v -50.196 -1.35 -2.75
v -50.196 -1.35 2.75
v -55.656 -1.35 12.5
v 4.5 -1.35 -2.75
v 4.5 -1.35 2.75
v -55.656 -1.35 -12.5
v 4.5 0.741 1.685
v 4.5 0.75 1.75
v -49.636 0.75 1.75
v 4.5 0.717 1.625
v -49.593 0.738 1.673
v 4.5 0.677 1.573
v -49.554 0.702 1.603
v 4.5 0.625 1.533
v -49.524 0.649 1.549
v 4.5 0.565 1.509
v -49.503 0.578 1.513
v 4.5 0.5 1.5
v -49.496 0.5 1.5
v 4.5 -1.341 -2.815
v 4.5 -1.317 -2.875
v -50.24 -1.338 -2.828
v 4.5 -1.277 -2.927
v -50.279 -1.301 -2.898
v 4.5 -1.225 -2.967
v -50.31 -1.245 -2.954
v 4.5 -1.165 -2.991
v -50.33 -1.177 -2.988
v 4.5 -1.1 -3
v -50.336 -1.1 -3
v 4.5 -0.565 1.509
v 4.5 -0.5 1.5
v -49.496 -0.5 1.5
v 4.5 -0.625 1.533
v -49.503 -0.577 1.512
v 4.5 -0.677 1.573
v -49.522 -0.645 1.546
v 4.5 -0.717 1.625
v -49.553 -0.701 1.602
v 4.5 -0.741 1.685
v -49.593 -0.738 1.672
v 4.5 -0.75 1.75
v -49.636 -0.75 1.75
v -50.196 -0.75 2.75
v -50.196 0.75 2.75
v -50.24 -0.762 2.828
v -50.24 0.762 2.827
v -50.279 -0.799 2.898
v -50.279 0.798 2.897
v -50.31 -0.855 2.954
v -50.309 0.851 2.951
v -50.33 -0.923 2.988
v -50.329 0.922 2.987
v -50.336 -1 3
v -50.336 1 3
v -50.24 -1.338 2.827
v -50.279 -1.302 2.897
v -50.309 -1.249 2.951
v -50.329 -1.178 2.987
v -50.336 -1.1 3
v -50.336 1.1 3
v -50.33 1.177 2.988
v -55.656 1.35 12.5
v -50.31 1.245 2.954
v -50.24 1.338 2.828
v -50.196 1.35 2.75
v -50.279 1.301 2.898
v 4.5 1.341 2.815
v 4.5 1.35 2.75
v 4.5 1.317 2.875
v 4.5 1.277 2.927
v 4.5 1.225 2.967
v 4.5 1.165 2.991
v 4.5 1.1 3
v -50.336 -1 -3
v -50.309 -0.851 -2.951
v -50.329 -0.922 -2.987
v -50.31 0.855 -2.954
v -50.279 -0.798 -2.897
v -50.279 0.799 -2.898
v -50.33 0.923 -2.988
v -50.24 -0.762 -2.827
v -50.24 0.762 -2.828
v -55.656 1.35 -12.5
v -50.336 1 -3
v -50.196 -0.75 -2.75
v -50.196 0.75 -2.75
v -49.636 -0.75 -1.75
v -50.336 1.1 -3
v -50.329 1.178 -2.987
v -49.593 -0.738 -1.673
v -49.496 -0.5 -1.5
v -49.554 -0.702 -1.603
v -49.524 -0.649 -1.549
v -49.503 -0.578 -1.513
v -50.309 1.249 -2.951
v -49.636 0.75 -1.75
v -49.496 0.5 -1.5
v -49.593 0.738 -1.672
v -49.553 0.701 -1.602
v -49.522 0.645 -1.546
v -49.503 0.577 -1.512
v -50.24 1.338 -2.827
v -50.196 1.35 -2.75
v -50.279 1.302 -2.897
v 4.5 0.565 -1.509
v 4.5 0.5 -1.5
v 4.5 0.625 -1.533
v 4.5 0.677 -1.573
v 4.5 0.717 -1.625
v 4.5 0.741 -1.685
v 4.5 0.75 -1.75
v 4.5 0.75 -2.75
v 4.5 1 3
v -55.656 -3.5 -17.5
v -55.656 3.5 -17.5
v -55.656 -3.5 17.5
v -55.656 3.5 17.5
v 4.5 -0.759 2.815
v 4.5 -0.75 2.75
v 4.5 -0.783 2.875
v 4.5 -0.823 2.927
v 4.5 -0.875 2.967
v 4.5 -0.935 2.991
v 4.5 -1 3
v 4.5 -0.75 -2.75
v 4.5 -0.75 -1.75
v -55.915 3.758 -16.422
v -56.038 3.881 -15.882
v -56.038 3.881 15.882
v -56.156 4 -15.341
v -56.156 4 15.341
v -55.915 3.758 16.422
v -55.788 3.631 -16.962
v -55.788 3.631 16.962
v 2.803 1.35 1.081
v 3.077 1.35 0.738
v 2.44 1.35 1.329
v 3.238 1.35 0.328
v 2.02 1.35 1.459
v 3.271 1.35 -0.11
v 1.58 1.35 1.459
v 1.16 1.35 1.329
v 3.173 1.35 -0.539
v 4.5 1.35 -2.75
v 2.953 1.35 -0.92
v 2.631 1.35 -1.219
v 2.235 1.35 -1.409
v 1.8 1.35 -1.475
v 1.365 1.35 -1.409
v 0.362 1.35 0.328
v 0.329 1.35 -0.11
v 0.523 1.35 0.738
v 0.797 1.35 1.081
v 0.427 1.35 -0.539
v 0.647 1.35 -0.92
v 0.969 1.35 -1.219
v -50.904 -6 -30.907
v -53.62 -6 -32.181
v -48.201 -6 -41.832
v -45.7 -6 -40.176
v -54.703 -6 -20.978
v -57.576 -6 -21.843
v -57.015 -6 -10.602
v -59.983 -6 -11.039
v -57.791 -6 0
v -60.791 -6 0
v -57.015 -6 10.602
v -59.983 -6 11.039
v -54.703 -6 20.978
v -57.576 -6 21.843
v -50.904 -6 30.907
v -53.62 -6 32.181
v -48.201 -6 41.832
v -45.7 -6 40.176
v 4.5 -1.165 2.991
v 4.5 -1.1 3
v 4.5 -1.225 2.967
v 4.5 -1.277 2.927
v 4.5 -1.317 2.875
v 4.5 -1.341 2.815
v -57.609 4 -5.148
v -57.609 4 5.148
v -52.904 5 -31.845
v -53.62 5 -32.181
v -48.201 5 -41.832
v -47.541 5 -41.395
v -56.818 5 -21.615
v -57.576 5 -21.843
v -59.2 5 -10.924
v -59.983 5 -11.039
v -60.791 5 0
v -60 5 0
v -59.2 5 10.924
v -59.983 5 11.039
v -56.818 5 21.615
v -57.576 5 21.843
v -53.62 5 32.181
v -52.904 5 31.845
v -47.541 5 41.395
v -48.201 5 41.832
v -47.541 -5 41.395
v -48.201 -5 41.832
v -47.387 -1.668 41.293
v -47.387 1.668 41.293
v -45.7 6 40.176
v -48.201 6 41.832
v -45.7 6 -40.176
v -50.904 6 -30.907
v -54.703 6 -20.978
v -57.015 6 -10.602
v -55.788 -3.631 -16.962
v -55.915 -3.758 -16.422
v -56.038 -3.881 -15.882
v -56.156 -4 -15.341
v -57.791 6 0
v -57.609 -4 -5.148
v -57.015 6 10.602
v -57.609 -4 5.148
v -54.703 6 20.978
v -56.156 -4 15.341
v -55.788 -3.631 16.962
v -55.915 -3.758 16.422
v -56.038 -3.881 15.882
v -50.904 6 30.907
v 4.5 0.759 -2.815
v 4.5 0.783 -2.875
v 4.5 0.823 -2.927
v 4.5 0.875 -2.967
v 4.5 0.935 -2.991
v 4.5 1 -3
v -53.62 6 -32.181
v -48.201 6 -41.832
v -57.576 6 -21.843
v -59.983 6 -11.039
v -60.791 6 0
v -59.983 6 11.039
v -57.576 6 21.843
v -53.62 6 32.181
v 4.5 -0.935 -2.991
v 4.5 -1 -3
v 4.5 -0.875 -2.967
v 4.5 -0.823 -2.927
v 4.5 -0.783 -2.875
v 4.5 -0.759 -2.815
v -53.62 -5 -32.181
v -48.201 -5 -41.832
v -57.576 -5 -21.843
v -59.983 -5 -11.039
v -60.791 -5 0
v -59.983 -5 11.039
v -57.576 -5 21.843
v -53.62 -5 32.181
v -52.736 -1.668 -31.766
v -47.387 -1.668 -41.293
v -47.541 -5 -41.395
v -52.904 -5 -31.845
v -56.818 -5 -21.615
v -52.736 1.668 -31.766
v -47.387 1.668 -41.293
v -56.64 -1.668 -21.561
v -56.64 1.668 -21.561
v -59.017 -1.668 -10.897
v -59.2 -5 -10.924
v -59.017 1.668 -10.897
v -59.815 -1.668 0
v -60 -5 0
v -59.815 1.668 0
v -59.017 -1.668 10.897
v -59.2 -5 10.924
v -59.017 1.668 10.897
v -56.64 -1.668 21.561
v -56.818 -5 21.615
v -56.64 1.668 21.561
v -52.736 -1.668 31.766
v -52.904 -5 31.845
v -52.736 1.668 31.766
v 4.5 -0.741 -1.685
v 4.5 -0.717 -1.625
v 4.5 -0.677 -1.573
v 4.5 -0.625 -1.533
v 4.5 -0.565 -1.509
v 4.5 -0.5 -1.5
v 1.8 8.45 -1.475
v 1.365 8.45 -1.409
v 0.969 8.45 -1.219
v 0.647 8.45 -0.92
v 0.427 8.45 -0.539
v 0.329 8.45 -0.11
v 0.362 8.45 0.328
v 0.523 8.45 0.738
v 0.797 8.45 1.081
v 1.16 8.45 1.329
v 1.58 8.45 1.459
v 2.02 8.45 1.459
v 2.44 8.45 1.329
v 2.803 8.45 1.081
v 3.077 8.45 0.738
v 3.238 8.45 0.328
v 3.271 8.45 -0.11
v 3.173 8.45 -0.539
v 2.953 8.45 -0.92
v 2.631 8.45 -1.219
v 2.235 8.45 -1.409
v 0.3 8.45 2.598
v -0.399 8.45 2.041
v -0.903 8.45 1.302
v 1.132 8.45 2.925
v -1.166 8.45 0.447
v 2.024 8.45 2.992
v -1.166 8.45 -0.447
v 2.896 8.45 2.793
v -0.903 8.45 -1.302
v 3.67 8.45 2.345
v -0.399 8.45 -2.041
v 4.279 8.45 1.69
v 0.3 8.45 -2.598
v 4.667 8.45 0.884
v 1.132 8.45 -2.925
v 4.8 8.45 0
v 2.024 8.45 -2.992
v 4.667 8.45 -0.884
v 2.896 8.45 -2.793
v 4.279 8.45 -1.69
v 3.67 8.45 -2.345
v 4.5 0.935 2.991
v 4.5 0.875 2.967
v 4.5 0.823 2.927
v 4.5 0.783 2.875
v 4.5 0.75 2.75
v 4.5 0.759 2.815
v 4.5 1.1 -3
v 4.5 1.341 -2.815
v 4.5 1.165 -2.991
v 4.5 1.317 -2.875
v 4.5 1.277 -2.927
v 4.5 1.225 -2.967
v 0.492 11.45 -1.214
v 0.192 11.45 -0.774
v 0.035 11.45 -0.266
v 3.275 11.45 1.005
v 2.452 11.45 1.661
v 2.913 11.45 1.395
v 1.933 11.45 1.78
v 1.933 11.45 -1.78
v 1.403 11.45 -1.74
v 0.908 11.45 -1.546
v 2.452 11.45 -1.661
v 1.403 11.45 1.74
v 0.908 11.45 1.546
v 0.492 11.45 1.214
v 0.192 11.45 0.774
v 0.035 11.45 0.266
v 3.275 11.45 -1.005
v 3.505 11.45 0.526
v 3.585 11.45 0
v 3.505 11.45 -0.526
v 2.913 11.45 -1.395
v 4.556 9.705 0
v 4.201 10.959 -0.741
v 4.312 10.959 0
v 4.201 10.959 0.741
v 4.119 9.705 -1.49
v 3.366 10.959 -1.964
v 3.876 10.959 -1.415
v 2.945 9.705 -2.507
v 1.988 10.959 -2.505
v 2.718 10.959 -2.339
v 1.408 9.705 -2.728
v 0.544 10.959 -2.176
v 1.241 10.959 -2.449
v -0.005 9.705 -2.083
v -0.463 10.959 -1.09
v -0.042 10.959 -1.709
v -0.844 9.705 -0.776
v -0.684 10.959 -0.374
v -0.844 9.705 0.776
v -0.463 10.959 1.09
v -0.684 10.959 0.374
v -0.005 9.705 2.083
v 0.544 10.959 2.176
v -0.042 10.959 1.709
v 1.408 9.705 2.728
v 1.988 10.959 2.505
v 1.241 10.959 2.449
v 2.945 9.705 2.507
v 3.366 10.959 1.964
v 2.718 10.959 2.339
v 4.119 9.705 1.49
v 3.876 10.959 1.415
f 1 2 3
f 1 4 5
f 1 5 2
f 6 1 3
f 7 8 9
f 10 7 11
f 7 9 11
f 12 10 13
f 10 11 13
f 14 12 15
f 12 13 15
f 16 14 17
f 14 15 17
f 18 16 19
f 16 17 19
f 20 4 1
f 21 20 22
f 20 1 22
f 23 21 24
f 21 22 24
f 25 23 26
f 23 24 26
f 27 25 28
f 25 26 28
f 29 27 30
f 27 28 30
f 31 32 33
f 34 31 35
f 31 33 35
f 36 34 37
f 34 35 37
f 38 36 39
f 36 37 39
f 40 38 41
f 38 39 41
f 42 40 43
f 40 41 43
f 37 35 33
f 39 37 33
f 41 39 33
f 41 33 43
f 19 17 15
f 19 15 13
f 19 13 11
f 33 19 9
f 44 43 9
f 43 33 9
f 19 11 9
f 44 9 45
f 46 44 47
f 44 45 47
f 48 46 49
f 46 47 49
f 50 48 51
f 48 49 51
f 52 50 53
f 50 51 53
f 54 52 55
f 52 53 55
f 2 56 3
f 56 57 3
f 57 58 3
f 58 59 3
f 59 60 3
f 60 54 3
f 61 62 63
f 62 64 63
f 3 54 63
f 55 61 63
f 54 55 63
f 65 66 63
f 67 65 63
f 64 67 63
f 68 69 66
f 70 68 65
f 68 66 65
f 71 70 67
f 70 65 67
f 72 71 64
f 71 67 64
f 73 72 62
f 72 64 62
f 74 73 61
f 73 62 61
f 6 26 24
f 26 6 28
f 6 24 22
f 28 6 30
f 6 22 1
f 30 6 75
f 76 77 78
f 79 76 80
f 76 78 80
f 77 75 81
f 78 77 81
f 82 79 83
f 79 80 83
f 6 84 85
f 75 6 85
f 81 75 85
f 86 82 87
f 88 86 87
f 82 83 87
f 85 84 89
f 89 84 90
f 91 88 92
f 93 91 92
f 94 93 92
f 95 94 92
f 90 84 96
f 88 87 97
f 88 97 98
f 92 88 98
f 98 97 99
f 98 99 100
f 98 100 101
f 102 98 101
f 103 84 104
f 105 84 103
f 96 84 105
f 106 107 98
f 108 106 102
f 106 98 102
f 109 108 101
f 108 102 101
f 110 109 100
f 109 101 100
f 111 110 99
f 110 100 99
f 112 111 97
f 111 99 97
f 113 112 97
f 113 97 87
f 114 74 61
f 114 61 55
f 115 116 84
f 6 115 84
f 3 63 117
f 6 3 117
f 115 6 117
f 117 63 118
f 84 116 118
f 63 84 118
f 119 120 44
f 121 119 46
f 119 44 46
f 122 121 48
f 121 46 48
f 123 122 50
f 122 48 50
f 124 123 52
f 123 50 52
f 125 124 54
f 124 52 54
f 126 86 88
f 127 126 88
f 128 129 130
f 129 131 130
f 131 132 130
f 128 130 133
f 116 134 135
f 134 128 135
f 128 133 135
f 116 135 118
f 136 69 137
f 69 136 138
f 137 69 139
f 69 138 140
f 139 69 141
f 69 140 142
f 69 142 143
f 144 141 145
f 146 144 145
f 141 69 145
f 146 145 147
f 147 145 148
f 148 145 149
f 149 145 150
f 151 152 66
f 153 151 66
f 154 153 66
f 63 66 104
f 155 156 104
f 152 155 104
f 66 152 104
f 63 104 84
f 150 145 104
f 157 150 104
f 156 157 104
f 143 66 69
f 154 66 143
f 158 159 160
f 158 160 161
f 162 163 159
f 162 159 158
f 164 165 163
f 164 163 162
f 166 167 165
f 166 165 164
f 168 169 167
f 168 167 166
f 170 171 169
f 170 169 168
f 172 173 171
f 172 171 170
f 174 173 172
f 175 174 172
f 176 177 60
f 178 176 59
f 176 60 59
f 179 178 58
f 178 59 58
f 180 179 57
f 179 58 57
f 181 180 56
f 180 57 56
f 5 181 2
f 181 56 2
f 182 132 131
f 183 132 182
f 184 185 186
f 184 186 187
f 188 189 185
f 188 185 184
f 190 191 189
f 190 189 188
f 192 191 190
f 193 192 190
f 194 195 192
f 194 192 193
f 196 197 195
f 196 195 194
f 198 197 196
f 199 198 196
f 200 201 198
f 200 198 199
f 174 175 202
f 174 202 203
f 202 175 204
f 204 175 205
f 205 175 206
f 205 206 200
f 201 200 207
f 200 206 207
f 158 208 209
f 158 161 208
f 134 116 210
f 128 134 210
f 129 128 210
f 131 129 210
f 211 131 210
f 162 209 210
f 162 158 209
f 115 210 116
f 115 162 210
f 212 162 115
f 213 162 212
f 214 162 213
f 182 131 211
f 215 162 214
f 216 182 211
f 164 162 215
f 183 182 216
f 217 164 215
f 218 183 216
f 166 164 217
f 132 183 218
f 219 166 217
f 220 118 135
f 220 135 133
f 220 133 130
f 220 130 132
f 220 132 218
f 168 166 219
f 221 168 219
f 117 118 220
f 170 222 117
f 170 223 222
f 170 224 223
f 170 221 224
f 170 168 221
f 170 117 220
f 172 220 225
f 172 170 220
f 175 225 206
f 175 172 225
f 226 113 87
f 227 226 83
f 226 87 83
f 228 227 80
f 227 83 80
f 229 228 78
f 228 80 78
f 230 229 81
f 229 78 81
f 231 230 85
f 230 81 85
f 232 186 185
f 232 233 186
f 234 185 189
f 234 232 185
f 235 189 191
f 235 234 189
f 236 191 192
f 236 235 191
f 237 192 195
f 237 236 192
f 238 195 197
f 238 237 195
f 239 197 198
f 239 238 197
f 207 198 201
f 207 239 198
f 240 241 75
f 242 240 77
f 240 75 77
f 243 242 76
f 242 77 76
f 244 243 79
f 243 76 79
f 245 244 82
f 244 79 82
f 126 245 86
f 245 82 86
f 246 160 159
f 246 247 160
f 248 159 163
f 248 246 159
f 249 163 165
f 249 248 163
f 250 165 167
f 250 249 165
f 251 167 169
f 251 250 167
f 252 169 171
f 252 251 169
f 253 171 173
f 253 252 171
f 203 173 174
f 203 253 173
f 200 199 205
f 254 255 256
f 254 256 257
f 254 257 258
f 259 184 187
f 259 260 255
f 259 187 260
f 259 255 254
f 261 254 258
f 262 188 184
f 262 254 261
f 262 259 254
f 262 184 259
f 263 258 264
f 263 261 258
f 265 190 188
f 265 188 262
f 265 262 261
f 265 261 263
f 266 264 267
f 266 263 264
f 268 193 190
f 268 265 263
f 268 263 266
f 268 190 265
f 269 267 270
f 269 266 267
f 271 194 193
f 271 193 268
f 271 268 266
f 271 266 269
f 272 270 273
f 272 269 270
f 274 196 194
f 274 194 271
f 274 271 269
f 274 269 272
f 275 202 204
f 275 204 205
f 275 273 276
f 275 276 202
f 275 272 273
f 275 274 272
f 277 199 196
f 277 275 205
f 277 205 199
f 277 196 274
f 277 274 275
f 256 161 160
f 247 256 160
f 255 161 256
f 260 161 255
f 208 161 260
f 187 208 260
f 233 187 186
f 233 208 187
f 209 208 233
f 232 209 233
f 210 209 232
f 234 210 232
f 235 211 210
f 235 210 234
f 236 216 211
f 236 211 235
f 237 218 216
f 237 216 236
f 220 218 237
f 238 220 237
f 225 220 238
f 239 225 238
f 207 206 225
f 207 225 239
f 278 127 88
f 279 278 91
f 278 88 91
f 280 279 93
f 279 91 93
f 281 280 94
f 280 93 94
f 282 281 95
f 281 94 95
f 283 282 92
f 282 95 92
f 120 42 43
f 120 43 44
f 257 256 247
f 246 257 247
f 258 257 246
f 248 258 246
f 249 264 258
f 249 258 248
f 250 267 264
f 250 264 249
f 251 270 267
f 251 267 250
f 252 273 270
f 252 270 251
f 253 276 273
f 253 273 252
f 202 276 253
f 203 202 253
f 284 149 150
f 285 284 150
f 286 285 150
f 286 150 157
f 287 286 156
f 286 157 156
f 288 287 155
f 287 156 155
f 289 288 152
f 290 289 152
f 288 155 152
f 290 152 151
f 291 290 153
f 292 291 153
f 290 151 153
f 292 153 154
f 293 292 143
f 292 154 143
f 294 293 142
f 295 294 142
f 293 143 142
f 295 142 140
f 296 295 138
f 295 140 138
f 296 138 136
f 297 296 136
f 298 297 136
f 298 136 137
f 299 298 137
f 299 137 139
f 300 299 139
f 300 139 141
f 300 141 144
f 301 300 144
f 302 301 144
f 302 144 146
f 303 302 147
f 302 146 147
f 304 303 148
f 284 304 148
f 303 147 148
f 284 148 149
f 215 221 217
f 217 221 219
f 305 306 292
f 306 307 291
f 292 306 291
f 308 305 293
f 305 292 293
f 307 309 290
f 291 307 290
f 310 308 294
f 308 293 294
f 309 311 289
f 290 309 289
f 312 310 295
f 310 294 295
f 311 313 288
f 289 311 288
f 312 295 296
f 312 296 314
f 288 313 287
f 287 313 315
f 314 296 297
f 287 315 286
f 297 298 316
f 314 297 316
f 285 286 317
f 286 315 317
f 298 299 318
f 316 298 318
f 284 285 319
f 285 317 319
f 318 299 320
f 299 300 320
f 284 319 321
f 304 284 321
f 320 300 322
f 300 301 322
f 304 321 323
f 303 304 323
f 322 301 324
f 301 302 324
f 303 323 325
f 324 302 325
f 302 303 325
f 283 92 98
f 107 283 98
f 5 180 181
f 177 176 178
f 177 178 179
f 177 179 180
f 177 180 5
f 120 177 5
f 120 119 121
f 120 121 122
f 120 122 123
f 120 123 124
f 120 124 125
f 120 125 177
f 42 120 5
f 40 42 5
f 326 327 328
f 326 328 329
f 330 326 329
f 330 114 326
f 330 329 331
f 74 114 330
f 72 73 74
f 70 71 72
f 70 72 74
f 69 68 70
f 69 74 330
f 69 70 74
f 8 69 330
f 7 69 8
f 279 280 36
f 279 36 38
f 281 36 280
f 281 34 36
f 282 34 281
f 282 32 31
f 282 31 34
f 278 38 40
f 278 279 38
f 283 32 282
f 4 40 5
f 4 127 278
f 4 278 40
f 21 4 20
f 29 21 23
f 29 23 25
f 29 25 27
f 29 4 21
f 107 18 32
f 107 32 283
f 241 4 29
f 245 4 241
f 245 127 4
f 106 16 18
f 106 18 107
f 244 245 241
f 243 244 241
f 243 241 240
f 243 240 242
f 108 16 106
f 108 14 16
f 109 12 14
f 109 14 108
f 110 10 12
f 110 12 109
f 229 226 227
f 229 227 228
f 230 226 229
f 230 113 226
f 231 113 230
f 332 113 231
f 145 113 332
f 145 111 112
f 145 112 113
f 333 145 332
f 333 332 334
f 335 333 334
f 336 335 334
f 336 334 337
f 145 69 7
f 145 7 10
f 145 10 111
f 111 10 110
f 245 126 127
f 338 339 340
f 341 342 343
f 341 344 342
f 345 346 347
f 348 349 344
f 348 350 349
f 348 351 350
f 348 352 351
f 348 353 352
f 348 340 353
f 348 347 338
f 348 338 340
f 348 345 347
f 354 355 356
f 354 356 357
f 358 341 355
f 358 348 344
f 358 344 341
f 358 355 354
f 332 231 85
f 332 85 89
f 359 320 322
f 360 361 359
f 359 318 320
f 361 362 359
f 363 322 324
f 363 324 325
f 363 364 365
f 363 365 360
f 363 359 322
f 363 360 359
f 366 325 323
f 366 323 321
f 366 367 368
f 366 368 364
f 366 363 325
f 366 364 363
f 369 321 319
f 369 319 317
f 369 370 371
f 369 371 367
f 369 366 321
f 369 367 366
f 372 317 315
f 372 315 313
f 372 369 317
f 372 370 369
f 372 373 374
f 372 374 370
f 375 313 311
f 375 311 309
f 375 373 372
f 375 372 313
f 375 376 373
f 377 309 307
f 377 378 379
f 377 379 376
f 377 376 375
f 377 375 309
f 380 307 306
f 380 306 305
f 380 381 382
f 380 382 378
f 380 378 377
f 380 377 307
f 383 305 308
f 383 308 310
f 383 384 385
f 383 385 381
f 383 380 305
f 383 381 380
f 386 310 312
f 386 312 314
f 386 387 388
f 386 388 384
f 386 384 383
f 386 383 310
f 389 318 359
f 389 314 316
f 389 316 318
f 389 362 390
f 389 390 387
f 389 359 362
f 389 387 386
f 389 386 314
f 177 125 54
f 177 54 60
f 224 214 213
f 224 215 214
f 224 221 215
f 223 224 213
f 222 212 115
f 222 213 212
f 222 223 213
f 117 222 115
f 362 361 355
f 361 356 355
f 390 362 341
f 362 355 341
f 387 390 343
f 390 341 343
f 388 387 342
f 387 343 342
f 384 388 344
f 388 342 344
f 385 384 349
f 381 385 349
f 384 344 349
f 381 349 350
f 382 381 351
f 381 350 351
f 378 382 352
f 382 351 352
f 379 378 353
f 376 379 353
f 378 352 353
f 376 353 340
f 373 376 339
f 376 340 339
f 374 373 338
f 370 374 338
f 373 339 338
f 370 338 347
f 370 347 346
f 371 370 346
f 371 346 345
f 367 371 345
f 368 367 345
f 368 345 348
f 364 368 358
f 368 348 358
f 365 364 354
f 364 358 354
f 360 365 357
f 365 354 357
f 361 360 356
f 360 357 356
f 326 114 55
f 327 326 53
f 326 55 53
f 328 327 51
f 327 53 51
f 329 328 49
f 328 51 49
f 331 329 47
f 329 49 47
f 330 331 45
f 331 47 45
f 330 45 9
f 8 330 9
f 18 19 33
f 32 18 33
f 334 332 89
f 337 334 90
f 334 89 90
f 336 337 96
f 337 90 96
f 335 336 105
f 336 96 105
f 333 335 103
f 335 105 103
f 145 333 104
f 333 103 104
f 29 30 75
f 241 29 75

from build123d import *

# Parameters (mm, degrees)
REVOLVE1_ANGLE                  = 67
BOSS_EXTRUDE1_REACH             = 76.037
BOSS_EXTRUDE1_END_RADIUS        = 72.791303716
BOSS_EXTRUDE1_DIRECTION_2_DEPTH = 4.5
BOSS_EXTRUDE2_DEPTH             = 4
BOSS_EXTRUDE3_DEPTH             = 1.35
CHAMFER1_SIZE                   = 0.5
SKETCH5_R                       = 1.475
BOSS_EXTRUDE4_DEPTH             = 7.1
SKETCH6_R                       = 3
BOSS_EXTRUDE5_DEPTH             = 3
BOSS_EXTRUDE5_TAPER             = 11
CHAMFER2_SIZE                   = 0.5
CHAMFER2_SIZE_2                 = 0.632256576


with BuildPart() as part:
    # Sketch1 → Revolve1 (revolve, symmetric)
    with BuildSketch(Plane.XY) as revolve1_sk:
        with BuildLine():
            Line((-60, 5), (-60.791303716, 5))
            Line((-60.791303716, 5), (-60.791303716, 6))
            Line((-60.791303716, 6), (-57.791303716, 6))
            Line((-57.791303716, 6), (-57.791303716, -6))
            Line((-57.791303716, -6), (-60.791303716, -6))
            Line((-60.791303716, -6), (-60.791303716, -5))
            Line((-60.791303716, -5), (-60, -5))
            ThreePointArc((-60, -5), (-59.791303716, 0), (-60, 5))
        make_face()
    revolve(axis=Axis((15, 24.442446043, 0), (0, -1, 0)), revolution_arc=REVOLVE1_ANGLE / 2)
    revolve(revolve1_sk.sketch, axis=Axis((15, 24.442446043, 0), (0, 1, 0)), revolution_arc=REVOLVE1_ANGLE / 2)

    # Boss-Extrude1: up to this cylinder (the profile starts inside it)
    boss_extrude1_end = Plane(origin=(15, 0, 0), z_dir=(0, 1, 0)) * Cylinder(BOSS_EXTRUDE1_END_RADIUS, 298.656607431, mode=Mode.PRIVATE)
    # Sketch2 → Boss-Extrude1 (add, up to the surface)
    with BuildSketch(Plane(origin=(0, 0, 0), x_dir=(0, 0, -1), z_dir=(1, 0, 0)), mode=Mode.PRIVATE) as boss_extrude1_sk1:
        with BuildLine():
            Line((2.75, 1.35), (-2.75, 1.35))
            ThreePointArc((-2.75, 1.35), (-2.926776695, 1.276776695), (-3, 1.1))
            Line((-3, 1.1), (-3, 1))
            ThreePointArc((-3, 1), (-2.926776695, 0.823223305), (-2.75, 0.75))
            Line((-2.75, 0.75), (-1.75, 0.75))
            ThreePointArc((-1.75, 0.75), (-1.573223305, 0.676776695), (-1.5, 0.5))
            Line((-1.5, 0.5), (-1.5, -0.5))
            ThreePointArc((-1.5, -0.5), (-1.573223305, -0.676776695), (-1.75, -0.75))
            Line((-1.75, -0.75), (-2.75, -0.75))
            ThreePointArc((-2.75, -0.75), (-2.926776695, -0.823223305), (-3, -1))
            Line((-3, -1), (-3, -1.1))
            ThreePointArc((-3, -1.1), (-2.926776695, -1.276776695), (-2.75, -1.35))
            Line((-2.75, -1.35), (2.75, -1.35))
            ThreePointArc((2.75, -1.35), (2.926776695, -1.276776695), (3, -1.1))
            Line((3, -1.1), (3, -1))
            ThreePointArc((3, -1), (2.926776695, -0.823223305), (2.75, -0.75))
            Line((2.75, -0.75), (1.75, -0.75))
            ThreePointArc((1.75, -0.75), (1.573223305, -0.676776695), (1.5, -0.5))
            Line((1.5, -0.5), (1.5, 0.5))
            ThreePointArc((1.5, 0.5), (1.573223305, 0.676776695), (1.75, 0.75))
            Line((1.75, 0.75), (2.75, 0.75))
            ThreePointArc((2.75, 0.75), (2.926776695, 0.823223305), (3, 1))
            Line((3, 1), (3, 1.1))
            ThreePointArc((3, 1.1), (2.926776695, 1.276776695), (2.75, 1.35))
        make_face()
    boss_extrude1_tool1 = extrude(boss_extrude1_sk1.sketch, amount=-BOSS_EXTRUDE1_REACH, mode=Mode.PRIVATE) & boss_extrude1_end
    add(boss_extrude1_tool1.solids().sort_by_distance((0, 0, 0))[0])

    # Sketch2 → Boss-Extrude1 direction 2 (add)
    with BuildSketch(Plane(origin=(0, 0, 0), x_dir=(0, 0, -1), z_dir=(1, 0, 0))):
        with BuildLine():
            Line((2.75, 1.35), (-2.75, 1.35))
            ThreePointArc((-2.75, 1.35), (-2.926776695, 1.276776695), (-3, 1.1))
            Line((-3, 1.1), (-3, 1))
            ThreePointArc((-3, 1), (-2.926776695, 0.823223305), (-2.75, 0.75))
            Line((-2.75, 0.75), (-1.75, 0.75))
            ThreePointArc((-1.75, 0.75), (-1.573223305, 0.676776695), (-1.5, 0.5))
            Line((-1.5, 0.5), (-1.5, -0.5))
            ThreePointArc((-1.5, -0.5), (-1.573223305, -0.676776695), (-1.75, -0.75))
            Line((-1.75, -0.75), (-2.75, -0.75))
            ThreePointArc((-2.75, -0.75), (-2.926776695, -0.823223305), (-3, -1))
            Line((-3, -1), (-3, -1.1))
            ThreePointArc((-3, -1.1), (-2.926776695, -1.276776695), (-2.75, -1.35))
            Line((-2.75, -1.35), (2.75, -1.35))
            ThreePointArc((2.75, -1.35), (2.926776695, -1.276776695), (3, -1.1))
            Line((3, -1.1), (3, -1))
            ThreePointArc((3, -1), (2.926776695, -0.823223305), (2.75, -0.75))
            Line((2.75, -0.75), (1.75, -0.75))
            ThreePointArc((1.75, -0.75), (1.573223305, -0.676776695), (1.5, -0.5))
            Line((1.5, -0.5), (1.5, 0.5))
            ThreePointArc((1.5, 0.5), (1.573223305, 0.676776695), (1.75, 0.75))
            Line((1.75, 0.75), (2.75, 0.75))
            ThreePointArc((2.75, 0.75), (2.926776695, 0.823223305), (3, 1))
            Line((3, 1), (3, 1.1))
            ThreePointArc((3, 1.1), (2.926776695, 1.276776695), (2.75, 1.35))
        make_face()
    extrude(amount=BOSS_EXTRUDE1_DIRECTION_2_DEPTH)

    # Sketch3 → Boss-Extrude2 (add, symmetric)
    with BuildSketch(Plane(origin=(0, 0, 0), x_dir=(1, 0, 0), z_dir=(0, 1, 0))):
        with BuildLine():
            Line((-55.656379023, 17.5), (-55.656379023, -17.5))
            ThreePointArc((-55.656379023, -17.5), (-57.791303716, 0), (-55.656379023, 17.5))
        make_face()
    extrude(amount=BOSS_EXTRUDE2_DEPTH, both=True)

    # Sketch4 → Boss-Extrude3 (add, symmetric)
    with BuildSketch(Plane(origin=(0, 0, 0), x_dir=(1, 0, 0), z_dir=(0, 1, 0))):
        Polygon((-55.656379023, -12.5), (-55.656379023, 12.5), (-48.656379023, 0), align=None)
    extrude(amount=BOSS_EXTRUDE3_DEPTH, both=True)

    # Chamfer1
    chamfer1_edges = [part.edges().sort_by_distance(p)[0] for p in [
        (-55.656379023, -4, 0),
        (-55.656379023, 4, 0),
    ]]
    chamfer(chamfer1_edges, length=CHAMFER1_SIZE)

    # Sketch5 → Boss-Extrude4 (add)
    with BuildSketch(Plane(origin=(0, 1.35, 0), x_dir=(1, 0, 0), z_dir=(0, 1, 0))):
        with Locations(Location((1.8, 0, 0), (0, 0, 90))):
            Circle(SKETCH5_R)
    extrude(amount=BOSS_EXTRUDE4_DEPTH)

    # Sketch6 → Boss-Extrude5 (add)
    with BuildSketch(Plane(origin=(0, 8.45, 0), x_dir=(1, 0, 0), z_dir=(0, 1, 0))):
        with Locations((1.8, 0)):
            Circle(SKETCH6_R)
    extrude(amount=BOSS_EXTRUDE5_DEPTH, taper=BOSS_EXTRUDE5_TAPER)

    # Chamfer2
    # the kernel refuses this chamfer: 0.632256576, 0.5 mm, written as the material it takes off along each edge
    with BuildSketch(Plane(origin=(1.8, 11.45, 0), x_dir=(1, 0, 0), z_dir=(0, 0, -1))) as chamfer2_piece_1:
        Polygon((2.416859073 + CHAMFER2_SIZE * 0.190808995377, CHAMFER2_SIZE * 0.981627183448), (2.416859073 - CHAMFER2_SIZE_2, 0), (2.416859073, 0), align=None)
    revolve(axis=Axis((1.8, 11.45, 0), (0, -1, 0)), mode=Mode.SUBTRACT)


solid = part.part
